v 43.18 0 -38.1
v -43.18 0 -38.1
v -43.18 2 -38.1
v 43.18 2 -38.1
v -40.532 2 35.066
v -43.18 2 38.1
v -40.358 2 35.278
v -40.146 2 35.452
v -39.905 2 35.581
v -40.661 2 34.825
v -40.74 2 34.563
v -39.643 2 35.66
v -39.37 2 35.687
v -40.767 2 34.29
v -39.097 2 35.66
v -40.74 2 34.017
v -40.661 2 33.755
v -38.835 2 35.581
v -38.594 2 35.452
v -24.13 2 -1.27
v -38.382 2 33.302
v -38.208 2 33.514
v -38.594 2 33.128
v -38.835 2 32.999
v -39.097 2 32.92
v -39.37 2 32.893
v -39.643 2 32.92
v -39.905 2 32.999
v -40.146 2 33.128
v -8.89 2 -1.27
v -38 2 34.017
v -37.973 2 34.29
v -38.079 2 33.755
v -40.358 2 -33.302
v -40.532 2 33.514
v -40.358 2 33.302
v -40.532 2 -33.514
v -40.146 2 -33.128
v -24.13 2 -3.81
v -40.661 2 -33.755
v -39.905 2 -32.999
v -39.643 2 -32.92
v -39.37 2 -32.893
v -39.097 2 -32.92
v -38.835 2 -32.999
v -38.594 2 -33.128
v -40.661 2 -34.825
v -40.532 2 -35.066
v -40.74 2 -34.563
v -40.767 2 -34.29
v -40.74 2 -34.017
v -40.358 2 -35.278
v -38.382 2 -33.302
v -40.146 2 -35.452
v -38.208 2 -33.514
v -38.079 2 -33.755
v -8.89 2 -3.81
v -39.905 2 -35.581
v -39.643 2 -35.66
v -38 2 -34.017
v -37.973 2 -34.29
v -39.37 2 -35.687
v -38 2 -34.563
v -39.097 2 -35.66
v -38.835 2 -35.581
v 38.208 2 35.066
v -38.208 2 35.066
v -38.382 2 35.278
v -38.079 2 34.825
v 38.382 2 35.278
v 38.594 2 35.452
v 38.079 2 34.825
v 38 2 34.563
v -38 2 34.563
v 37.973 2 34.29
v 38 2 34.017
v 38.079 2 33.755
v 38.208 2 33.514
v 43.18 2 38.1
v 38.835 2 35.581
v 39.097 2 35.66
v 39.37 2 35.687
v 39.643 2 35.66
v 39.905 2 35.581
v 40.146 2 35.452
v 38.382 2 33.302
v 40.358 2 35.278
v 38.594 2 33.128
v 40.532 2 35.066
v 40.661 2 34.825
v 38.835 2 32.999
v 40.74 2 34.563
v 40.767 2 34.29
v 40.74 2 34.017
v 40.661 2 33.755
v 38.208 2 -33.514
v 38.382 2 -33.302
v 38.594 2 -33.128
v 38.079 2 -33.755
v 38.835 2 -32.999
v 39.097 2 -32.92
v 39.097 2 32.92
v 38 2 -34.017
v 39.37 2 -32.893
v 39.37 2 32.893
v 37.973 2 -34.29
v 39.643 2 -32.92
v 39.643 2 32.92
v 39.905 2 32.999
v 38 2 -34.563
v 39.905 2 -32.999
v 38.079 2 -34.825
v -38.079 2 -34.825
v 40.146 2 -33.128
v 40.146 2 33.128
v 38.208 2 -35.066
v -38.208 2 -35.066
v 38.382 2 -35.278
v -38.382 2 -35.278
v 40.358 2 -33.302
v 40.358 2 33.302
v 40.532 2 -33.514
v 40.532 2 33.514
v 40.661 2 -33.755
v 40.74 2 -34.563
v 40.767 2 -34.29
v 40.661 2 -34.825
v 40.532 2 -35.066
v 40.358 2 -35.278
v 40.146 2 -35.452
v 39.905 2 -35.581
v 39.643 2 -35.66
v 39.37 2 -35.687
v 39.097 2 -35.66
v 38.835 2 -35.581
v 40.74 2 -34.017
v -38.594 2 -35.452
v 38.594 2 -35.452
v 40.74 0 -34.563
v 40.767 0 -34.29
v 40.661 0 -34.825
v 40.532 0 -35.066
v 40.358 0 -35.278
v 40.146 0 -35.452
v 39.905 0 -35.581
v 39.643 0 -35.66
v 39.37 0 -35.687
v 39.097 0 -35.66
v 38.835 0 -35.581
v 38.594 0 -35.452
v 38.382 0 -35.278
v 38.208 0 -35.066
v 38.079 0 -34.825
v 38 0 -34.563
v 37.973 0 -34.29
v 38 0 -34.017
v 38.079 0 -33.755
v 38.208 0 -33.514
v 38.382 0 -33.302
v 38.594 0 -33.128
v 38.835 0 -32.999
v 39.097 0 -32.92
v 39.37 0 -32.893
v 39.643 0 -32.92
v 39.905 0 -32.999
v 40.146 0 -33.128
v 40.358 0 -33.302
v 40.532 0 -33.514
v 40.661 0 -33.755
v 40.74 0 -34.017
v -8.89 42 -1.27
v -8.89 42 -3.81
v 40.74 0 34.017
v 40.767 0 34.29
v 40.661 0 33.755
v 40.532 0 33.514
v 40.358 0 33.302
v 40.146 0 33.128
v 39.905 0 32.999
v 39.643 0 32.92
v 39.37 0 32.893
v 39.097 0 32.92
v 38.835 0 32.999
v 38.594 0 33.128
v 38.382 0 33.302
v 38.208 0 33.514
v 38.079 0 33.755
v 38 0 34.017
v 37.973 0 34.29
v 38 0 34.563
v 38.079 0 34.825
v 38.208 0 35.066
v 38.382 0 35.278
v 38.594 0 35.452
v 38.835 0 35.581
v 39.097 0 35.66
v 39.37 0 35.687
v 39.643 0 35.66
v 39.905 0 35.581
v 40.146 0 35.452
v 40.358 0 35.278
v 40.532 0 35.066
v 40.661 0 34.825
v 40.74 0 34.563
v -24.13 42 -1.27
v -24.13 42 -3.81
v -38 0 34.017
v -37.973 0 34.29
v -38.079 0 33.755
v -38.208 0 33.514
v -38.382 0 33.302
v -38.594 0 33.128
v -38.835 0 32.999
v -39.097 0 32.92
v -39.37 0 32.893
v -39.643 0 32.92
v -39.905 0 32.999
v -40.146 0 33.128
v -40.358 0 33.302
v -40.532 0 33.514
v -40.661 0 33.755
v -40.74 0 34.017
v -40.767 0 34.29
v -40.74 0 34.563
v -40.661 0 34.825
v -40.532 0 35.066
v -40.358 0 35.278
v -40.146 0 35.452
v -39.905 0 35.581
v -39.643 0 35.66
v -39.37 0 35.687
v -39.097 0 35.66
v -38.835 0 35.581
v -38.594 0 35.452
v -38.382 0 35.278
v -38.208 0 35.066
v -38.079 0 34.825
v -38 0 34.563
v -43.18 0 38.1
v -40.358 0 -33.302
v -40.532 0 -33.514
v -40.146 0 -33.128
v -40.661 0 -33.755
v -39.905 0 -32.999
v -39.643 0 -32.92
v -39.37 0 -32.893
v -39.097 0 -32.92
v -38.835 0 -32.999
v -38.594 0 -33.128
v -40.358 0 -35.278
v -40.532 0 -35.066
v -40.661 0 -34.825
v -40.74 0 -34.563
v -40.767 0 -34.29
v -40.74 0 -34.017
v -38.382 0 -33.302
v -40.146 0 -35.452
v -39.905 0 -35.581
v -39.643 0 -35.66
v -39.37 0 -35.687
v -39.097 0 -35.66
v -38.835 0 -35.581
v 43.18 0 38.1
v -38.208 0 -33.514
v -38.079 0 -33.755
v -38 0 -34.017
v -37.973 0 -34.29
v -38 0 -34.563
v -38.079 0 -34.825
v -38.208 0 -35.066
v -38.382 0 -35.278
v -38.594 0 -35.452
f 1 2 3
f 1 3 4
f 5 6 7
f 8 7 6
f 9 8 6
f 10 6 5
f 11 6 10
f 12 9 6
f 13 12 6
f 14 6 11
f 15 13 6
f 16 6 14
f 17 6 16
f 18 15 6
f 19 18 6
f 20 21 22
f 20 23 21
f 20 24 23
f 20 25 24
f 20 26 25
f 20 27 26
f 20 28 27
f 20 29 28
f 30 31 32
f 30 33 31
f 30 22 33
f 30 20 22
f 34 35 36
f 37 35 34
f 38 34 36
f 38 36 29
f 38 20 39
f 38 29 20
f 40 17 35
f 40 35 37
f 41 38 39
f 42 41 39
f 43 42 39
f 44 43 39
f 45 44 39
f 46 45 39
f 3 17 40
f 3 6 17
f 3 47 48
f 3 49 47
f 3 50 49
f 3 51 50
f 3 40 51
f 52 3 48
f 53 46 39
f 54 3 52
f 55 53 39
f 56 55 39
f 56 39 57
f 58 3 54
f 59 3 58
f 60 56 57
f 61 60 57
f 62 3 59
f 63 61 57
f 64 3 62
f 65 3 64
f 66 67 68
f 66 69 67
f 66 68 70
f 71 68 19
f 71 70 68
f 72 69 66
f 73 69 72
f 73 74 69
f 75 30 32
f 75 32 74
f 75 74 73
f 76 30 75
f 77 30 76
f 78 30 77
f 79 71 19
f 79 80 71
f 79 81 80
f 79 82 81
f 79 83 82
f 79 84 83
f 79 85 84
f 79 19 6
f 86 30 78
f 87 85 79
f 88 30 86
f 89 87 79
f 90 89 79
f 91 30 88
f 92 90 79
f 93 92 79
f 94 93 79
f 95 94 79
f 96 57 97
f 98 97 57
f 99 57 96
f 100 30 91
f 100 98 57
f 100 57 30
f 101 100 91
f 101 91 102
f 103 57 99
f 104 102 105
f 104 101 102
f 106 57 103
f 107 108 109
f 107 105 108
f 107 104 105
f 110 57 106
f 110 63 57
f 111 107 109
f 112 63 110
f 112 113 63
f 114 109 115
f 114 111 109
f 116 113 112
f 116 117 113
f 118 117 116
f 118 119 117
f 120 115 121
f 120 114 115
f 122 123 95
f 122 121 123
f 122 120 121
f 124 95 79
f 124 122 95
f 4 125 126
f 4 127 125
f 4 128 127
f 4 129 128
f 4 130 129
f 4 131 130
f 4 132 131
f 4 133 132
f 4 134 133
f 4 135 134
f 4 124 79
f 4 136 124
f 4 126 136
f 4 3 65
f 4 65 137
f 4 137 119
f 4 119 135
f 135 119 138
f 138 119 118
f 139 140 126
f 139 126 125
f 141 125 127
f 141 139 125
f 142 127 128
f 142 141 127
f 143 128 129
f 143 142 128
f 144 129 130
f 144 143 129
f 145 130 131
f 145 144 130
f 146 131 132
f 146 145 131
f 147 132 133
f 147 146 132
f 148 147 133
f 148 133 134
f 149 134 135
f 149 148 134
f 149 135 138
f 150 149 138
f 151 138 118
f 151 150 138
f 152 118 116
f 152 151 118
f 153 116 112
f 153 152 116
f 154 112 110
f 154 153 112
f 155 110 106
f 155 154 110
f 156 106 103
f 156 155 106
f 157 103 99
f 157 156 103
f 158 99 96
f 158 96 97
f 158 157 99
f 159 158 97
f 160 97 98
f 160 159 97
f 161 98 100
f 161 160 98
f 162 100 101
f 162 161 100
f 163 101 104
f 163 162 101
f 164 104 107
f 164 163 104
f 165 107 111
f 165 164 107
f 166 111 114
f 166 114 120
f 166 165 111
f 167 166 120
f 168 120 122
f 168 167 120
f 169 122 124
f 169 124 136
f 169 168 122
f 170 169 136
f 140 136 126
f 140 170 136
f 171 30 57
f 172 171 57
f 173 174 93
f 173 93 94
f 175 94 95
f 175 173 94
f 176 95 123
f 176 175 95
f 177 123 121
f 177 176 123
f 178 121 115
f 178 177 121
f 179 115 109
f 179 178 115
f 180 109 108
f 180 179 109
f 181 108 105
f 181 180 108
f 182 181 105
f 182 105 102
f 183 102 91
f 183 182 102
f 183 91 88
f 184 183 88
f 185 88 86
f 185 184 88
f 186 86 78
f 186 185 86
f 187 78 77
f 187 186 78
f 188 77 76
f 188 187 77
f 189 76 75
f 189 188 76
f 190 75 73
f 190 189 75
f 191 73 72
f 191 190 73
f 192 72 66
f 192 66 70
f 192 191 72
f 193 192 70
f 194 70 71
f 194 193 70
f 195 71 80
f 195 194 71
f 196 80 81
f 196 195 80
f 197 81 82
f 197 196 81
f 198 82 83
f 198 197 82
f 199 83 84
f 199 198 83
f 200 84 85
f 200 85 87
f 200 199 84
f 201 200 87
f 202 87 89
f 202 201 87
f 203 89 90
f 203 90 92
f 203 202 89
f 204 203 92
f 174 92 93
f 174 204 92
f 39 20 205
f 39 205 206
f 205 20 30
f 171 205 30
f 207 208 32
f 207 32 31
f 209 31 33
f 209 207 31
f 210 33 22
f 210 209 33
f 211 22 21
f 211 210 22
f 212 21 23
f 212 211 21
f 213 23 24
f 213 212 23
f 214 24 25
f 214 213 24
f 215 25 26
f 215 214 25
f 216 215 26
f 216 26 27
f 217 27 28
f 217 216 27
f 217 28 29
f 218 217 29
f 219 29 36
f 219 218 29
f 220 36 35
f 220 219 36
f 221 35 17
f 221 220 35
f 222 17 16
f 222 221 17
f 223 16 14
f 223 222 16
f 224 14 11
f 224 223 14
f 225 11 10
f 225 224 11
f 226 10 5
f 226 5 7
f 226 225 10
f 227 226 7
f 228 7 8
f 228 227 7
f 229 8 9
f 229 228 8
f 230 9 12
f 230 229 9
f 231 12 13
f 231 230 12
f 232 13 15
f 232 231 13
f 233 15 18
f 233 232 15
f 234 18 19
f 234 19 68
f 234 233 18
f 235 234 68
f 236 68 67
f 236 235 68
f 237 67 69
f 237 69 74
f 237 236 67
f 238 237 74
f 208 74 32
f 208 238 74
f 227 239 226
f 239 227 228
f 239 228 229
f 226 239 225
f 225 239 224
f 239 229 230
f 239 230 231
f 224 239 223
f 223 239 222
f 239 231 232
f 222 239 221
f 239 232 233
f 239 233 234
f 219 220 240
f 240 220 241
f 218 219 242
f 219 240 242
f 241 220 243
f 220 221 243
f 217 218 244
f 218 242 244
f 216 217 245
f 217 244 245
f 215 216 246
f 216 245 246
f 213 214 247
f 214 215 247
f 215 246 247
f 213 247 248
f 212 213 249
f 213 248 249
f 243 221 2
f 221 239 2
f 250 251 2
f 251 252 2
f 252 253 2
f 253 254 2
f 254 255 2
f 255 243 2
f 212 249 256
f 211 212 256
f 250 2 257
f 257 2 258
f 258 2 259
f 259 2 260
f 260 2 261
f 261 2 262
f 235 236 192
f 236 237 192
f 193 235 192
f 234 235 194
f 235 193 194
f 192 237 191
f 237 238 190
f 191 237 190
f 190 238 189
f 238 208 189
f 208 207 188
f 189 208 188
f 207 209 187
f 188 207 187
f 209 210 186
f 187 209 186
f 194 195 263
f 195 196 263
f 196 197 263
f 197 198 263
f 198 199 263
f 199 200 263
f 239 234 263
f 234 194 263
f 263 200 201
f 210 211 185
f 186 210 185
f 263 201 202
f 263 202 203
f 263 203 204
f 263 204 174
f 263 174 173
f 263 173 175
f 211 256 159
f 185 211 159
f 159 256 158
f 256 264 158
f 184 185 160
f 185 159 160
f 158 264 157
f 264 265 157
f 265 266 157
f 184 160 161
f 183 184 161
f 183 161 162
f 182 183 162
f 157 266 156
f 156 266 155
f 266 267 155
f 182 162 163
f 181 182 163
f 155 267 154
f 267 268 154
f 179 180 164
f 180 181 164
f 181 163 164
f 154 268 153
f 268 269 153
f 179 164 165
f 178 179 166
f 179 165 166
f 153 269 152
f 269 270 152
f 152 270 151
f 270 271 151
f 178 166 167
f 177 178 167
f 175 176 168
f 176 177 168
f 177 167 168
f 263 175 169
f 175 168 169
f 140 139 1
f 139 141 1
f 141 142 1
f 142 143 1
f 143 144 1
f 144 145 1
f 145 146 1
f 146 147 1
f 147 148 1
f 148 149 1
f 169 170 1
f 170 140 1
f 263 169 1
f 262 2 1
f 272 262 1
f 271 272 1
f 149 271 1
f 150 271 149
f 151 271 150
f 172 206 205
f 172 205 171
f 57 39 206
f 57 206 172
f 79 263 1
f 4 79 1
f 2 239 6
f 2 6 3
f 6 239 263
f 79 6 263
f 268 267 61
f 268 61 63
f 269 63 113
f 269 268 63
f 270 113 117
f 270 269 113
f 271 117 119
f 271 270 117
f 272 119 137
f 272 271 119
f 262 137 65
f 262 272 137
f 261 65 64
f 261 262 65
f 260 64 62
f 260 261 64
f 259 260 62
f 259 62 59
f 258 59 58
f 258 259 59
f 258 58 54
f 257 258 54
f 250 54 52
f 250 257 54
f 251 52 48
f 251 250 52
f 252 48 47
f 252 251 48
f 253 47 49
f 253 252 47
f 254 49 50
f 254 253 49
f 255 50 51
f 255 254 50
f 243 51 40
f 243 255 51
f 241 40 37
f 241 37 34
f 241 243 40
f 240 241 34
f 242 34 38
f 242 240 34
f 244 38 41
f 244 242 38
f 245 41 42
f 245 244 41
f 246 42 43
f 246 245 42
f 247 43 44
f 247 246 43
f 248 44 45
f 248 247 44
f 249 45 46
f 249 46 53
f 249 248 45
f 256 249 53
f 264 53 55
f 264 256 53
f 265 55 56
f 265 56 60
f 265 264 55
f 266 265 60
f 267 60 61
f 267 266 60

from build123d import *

# Parameters (mm, degrees)
SKETCH1_W           = 86.36
SKETCH1_H           = 76.2
SKETCH1_R           = 1.397
BOSS_EXTRUDE1_DEPTH = 2
SKETCH2_W           = 15.24
SKETCH2_H           = 2.54
BOSS_EXTRUDE2_DEPTH = 40


with BuildPart() as part:
    # Sketch1 → Boss-Extrude1 (new body)
    with BuildSketch(Plane(origin=(0, 0, 0), x_dir=(1, 0, 0), z_dir=(0, 1, 0))):
        Rectangle(SKETCH1_W, SKETCH1_H)
        with Locations((-39.37, 34.29)):
            Circle(SKETCH1_R, mode=Mode.SUBTRACT)
        with Locations((39.37, -34.29)):
            Circle(SKETCH1_R, mode=Mode.SUBTRACT)
        with Locations((-39.37, -34.29)):
            Circle(SKETCH1_R, mode=Mode.SUBTRACT)
        with Locations((39.37, 34.29)):
            Circle(SKETCH1_R, mode=Mode.SUBTRACT)
    extrude(amount=BOSS_EXTRUDE1_DEPTH)

    # Sketch2 → Boss-Extrude2 (add)
    with BuildSketch(Plane(origin=(0, 2, 0), x_dir=(1, 0, 0), z_dir=(0, 1, 0))):
        with Locations((-16.51, 2.54)):
            Rectangle(SKETCH2_W, SKETCH2_H)
    extrude(amount=BOSS_EXTRUDE2_DEPTH)


solid = part.part
